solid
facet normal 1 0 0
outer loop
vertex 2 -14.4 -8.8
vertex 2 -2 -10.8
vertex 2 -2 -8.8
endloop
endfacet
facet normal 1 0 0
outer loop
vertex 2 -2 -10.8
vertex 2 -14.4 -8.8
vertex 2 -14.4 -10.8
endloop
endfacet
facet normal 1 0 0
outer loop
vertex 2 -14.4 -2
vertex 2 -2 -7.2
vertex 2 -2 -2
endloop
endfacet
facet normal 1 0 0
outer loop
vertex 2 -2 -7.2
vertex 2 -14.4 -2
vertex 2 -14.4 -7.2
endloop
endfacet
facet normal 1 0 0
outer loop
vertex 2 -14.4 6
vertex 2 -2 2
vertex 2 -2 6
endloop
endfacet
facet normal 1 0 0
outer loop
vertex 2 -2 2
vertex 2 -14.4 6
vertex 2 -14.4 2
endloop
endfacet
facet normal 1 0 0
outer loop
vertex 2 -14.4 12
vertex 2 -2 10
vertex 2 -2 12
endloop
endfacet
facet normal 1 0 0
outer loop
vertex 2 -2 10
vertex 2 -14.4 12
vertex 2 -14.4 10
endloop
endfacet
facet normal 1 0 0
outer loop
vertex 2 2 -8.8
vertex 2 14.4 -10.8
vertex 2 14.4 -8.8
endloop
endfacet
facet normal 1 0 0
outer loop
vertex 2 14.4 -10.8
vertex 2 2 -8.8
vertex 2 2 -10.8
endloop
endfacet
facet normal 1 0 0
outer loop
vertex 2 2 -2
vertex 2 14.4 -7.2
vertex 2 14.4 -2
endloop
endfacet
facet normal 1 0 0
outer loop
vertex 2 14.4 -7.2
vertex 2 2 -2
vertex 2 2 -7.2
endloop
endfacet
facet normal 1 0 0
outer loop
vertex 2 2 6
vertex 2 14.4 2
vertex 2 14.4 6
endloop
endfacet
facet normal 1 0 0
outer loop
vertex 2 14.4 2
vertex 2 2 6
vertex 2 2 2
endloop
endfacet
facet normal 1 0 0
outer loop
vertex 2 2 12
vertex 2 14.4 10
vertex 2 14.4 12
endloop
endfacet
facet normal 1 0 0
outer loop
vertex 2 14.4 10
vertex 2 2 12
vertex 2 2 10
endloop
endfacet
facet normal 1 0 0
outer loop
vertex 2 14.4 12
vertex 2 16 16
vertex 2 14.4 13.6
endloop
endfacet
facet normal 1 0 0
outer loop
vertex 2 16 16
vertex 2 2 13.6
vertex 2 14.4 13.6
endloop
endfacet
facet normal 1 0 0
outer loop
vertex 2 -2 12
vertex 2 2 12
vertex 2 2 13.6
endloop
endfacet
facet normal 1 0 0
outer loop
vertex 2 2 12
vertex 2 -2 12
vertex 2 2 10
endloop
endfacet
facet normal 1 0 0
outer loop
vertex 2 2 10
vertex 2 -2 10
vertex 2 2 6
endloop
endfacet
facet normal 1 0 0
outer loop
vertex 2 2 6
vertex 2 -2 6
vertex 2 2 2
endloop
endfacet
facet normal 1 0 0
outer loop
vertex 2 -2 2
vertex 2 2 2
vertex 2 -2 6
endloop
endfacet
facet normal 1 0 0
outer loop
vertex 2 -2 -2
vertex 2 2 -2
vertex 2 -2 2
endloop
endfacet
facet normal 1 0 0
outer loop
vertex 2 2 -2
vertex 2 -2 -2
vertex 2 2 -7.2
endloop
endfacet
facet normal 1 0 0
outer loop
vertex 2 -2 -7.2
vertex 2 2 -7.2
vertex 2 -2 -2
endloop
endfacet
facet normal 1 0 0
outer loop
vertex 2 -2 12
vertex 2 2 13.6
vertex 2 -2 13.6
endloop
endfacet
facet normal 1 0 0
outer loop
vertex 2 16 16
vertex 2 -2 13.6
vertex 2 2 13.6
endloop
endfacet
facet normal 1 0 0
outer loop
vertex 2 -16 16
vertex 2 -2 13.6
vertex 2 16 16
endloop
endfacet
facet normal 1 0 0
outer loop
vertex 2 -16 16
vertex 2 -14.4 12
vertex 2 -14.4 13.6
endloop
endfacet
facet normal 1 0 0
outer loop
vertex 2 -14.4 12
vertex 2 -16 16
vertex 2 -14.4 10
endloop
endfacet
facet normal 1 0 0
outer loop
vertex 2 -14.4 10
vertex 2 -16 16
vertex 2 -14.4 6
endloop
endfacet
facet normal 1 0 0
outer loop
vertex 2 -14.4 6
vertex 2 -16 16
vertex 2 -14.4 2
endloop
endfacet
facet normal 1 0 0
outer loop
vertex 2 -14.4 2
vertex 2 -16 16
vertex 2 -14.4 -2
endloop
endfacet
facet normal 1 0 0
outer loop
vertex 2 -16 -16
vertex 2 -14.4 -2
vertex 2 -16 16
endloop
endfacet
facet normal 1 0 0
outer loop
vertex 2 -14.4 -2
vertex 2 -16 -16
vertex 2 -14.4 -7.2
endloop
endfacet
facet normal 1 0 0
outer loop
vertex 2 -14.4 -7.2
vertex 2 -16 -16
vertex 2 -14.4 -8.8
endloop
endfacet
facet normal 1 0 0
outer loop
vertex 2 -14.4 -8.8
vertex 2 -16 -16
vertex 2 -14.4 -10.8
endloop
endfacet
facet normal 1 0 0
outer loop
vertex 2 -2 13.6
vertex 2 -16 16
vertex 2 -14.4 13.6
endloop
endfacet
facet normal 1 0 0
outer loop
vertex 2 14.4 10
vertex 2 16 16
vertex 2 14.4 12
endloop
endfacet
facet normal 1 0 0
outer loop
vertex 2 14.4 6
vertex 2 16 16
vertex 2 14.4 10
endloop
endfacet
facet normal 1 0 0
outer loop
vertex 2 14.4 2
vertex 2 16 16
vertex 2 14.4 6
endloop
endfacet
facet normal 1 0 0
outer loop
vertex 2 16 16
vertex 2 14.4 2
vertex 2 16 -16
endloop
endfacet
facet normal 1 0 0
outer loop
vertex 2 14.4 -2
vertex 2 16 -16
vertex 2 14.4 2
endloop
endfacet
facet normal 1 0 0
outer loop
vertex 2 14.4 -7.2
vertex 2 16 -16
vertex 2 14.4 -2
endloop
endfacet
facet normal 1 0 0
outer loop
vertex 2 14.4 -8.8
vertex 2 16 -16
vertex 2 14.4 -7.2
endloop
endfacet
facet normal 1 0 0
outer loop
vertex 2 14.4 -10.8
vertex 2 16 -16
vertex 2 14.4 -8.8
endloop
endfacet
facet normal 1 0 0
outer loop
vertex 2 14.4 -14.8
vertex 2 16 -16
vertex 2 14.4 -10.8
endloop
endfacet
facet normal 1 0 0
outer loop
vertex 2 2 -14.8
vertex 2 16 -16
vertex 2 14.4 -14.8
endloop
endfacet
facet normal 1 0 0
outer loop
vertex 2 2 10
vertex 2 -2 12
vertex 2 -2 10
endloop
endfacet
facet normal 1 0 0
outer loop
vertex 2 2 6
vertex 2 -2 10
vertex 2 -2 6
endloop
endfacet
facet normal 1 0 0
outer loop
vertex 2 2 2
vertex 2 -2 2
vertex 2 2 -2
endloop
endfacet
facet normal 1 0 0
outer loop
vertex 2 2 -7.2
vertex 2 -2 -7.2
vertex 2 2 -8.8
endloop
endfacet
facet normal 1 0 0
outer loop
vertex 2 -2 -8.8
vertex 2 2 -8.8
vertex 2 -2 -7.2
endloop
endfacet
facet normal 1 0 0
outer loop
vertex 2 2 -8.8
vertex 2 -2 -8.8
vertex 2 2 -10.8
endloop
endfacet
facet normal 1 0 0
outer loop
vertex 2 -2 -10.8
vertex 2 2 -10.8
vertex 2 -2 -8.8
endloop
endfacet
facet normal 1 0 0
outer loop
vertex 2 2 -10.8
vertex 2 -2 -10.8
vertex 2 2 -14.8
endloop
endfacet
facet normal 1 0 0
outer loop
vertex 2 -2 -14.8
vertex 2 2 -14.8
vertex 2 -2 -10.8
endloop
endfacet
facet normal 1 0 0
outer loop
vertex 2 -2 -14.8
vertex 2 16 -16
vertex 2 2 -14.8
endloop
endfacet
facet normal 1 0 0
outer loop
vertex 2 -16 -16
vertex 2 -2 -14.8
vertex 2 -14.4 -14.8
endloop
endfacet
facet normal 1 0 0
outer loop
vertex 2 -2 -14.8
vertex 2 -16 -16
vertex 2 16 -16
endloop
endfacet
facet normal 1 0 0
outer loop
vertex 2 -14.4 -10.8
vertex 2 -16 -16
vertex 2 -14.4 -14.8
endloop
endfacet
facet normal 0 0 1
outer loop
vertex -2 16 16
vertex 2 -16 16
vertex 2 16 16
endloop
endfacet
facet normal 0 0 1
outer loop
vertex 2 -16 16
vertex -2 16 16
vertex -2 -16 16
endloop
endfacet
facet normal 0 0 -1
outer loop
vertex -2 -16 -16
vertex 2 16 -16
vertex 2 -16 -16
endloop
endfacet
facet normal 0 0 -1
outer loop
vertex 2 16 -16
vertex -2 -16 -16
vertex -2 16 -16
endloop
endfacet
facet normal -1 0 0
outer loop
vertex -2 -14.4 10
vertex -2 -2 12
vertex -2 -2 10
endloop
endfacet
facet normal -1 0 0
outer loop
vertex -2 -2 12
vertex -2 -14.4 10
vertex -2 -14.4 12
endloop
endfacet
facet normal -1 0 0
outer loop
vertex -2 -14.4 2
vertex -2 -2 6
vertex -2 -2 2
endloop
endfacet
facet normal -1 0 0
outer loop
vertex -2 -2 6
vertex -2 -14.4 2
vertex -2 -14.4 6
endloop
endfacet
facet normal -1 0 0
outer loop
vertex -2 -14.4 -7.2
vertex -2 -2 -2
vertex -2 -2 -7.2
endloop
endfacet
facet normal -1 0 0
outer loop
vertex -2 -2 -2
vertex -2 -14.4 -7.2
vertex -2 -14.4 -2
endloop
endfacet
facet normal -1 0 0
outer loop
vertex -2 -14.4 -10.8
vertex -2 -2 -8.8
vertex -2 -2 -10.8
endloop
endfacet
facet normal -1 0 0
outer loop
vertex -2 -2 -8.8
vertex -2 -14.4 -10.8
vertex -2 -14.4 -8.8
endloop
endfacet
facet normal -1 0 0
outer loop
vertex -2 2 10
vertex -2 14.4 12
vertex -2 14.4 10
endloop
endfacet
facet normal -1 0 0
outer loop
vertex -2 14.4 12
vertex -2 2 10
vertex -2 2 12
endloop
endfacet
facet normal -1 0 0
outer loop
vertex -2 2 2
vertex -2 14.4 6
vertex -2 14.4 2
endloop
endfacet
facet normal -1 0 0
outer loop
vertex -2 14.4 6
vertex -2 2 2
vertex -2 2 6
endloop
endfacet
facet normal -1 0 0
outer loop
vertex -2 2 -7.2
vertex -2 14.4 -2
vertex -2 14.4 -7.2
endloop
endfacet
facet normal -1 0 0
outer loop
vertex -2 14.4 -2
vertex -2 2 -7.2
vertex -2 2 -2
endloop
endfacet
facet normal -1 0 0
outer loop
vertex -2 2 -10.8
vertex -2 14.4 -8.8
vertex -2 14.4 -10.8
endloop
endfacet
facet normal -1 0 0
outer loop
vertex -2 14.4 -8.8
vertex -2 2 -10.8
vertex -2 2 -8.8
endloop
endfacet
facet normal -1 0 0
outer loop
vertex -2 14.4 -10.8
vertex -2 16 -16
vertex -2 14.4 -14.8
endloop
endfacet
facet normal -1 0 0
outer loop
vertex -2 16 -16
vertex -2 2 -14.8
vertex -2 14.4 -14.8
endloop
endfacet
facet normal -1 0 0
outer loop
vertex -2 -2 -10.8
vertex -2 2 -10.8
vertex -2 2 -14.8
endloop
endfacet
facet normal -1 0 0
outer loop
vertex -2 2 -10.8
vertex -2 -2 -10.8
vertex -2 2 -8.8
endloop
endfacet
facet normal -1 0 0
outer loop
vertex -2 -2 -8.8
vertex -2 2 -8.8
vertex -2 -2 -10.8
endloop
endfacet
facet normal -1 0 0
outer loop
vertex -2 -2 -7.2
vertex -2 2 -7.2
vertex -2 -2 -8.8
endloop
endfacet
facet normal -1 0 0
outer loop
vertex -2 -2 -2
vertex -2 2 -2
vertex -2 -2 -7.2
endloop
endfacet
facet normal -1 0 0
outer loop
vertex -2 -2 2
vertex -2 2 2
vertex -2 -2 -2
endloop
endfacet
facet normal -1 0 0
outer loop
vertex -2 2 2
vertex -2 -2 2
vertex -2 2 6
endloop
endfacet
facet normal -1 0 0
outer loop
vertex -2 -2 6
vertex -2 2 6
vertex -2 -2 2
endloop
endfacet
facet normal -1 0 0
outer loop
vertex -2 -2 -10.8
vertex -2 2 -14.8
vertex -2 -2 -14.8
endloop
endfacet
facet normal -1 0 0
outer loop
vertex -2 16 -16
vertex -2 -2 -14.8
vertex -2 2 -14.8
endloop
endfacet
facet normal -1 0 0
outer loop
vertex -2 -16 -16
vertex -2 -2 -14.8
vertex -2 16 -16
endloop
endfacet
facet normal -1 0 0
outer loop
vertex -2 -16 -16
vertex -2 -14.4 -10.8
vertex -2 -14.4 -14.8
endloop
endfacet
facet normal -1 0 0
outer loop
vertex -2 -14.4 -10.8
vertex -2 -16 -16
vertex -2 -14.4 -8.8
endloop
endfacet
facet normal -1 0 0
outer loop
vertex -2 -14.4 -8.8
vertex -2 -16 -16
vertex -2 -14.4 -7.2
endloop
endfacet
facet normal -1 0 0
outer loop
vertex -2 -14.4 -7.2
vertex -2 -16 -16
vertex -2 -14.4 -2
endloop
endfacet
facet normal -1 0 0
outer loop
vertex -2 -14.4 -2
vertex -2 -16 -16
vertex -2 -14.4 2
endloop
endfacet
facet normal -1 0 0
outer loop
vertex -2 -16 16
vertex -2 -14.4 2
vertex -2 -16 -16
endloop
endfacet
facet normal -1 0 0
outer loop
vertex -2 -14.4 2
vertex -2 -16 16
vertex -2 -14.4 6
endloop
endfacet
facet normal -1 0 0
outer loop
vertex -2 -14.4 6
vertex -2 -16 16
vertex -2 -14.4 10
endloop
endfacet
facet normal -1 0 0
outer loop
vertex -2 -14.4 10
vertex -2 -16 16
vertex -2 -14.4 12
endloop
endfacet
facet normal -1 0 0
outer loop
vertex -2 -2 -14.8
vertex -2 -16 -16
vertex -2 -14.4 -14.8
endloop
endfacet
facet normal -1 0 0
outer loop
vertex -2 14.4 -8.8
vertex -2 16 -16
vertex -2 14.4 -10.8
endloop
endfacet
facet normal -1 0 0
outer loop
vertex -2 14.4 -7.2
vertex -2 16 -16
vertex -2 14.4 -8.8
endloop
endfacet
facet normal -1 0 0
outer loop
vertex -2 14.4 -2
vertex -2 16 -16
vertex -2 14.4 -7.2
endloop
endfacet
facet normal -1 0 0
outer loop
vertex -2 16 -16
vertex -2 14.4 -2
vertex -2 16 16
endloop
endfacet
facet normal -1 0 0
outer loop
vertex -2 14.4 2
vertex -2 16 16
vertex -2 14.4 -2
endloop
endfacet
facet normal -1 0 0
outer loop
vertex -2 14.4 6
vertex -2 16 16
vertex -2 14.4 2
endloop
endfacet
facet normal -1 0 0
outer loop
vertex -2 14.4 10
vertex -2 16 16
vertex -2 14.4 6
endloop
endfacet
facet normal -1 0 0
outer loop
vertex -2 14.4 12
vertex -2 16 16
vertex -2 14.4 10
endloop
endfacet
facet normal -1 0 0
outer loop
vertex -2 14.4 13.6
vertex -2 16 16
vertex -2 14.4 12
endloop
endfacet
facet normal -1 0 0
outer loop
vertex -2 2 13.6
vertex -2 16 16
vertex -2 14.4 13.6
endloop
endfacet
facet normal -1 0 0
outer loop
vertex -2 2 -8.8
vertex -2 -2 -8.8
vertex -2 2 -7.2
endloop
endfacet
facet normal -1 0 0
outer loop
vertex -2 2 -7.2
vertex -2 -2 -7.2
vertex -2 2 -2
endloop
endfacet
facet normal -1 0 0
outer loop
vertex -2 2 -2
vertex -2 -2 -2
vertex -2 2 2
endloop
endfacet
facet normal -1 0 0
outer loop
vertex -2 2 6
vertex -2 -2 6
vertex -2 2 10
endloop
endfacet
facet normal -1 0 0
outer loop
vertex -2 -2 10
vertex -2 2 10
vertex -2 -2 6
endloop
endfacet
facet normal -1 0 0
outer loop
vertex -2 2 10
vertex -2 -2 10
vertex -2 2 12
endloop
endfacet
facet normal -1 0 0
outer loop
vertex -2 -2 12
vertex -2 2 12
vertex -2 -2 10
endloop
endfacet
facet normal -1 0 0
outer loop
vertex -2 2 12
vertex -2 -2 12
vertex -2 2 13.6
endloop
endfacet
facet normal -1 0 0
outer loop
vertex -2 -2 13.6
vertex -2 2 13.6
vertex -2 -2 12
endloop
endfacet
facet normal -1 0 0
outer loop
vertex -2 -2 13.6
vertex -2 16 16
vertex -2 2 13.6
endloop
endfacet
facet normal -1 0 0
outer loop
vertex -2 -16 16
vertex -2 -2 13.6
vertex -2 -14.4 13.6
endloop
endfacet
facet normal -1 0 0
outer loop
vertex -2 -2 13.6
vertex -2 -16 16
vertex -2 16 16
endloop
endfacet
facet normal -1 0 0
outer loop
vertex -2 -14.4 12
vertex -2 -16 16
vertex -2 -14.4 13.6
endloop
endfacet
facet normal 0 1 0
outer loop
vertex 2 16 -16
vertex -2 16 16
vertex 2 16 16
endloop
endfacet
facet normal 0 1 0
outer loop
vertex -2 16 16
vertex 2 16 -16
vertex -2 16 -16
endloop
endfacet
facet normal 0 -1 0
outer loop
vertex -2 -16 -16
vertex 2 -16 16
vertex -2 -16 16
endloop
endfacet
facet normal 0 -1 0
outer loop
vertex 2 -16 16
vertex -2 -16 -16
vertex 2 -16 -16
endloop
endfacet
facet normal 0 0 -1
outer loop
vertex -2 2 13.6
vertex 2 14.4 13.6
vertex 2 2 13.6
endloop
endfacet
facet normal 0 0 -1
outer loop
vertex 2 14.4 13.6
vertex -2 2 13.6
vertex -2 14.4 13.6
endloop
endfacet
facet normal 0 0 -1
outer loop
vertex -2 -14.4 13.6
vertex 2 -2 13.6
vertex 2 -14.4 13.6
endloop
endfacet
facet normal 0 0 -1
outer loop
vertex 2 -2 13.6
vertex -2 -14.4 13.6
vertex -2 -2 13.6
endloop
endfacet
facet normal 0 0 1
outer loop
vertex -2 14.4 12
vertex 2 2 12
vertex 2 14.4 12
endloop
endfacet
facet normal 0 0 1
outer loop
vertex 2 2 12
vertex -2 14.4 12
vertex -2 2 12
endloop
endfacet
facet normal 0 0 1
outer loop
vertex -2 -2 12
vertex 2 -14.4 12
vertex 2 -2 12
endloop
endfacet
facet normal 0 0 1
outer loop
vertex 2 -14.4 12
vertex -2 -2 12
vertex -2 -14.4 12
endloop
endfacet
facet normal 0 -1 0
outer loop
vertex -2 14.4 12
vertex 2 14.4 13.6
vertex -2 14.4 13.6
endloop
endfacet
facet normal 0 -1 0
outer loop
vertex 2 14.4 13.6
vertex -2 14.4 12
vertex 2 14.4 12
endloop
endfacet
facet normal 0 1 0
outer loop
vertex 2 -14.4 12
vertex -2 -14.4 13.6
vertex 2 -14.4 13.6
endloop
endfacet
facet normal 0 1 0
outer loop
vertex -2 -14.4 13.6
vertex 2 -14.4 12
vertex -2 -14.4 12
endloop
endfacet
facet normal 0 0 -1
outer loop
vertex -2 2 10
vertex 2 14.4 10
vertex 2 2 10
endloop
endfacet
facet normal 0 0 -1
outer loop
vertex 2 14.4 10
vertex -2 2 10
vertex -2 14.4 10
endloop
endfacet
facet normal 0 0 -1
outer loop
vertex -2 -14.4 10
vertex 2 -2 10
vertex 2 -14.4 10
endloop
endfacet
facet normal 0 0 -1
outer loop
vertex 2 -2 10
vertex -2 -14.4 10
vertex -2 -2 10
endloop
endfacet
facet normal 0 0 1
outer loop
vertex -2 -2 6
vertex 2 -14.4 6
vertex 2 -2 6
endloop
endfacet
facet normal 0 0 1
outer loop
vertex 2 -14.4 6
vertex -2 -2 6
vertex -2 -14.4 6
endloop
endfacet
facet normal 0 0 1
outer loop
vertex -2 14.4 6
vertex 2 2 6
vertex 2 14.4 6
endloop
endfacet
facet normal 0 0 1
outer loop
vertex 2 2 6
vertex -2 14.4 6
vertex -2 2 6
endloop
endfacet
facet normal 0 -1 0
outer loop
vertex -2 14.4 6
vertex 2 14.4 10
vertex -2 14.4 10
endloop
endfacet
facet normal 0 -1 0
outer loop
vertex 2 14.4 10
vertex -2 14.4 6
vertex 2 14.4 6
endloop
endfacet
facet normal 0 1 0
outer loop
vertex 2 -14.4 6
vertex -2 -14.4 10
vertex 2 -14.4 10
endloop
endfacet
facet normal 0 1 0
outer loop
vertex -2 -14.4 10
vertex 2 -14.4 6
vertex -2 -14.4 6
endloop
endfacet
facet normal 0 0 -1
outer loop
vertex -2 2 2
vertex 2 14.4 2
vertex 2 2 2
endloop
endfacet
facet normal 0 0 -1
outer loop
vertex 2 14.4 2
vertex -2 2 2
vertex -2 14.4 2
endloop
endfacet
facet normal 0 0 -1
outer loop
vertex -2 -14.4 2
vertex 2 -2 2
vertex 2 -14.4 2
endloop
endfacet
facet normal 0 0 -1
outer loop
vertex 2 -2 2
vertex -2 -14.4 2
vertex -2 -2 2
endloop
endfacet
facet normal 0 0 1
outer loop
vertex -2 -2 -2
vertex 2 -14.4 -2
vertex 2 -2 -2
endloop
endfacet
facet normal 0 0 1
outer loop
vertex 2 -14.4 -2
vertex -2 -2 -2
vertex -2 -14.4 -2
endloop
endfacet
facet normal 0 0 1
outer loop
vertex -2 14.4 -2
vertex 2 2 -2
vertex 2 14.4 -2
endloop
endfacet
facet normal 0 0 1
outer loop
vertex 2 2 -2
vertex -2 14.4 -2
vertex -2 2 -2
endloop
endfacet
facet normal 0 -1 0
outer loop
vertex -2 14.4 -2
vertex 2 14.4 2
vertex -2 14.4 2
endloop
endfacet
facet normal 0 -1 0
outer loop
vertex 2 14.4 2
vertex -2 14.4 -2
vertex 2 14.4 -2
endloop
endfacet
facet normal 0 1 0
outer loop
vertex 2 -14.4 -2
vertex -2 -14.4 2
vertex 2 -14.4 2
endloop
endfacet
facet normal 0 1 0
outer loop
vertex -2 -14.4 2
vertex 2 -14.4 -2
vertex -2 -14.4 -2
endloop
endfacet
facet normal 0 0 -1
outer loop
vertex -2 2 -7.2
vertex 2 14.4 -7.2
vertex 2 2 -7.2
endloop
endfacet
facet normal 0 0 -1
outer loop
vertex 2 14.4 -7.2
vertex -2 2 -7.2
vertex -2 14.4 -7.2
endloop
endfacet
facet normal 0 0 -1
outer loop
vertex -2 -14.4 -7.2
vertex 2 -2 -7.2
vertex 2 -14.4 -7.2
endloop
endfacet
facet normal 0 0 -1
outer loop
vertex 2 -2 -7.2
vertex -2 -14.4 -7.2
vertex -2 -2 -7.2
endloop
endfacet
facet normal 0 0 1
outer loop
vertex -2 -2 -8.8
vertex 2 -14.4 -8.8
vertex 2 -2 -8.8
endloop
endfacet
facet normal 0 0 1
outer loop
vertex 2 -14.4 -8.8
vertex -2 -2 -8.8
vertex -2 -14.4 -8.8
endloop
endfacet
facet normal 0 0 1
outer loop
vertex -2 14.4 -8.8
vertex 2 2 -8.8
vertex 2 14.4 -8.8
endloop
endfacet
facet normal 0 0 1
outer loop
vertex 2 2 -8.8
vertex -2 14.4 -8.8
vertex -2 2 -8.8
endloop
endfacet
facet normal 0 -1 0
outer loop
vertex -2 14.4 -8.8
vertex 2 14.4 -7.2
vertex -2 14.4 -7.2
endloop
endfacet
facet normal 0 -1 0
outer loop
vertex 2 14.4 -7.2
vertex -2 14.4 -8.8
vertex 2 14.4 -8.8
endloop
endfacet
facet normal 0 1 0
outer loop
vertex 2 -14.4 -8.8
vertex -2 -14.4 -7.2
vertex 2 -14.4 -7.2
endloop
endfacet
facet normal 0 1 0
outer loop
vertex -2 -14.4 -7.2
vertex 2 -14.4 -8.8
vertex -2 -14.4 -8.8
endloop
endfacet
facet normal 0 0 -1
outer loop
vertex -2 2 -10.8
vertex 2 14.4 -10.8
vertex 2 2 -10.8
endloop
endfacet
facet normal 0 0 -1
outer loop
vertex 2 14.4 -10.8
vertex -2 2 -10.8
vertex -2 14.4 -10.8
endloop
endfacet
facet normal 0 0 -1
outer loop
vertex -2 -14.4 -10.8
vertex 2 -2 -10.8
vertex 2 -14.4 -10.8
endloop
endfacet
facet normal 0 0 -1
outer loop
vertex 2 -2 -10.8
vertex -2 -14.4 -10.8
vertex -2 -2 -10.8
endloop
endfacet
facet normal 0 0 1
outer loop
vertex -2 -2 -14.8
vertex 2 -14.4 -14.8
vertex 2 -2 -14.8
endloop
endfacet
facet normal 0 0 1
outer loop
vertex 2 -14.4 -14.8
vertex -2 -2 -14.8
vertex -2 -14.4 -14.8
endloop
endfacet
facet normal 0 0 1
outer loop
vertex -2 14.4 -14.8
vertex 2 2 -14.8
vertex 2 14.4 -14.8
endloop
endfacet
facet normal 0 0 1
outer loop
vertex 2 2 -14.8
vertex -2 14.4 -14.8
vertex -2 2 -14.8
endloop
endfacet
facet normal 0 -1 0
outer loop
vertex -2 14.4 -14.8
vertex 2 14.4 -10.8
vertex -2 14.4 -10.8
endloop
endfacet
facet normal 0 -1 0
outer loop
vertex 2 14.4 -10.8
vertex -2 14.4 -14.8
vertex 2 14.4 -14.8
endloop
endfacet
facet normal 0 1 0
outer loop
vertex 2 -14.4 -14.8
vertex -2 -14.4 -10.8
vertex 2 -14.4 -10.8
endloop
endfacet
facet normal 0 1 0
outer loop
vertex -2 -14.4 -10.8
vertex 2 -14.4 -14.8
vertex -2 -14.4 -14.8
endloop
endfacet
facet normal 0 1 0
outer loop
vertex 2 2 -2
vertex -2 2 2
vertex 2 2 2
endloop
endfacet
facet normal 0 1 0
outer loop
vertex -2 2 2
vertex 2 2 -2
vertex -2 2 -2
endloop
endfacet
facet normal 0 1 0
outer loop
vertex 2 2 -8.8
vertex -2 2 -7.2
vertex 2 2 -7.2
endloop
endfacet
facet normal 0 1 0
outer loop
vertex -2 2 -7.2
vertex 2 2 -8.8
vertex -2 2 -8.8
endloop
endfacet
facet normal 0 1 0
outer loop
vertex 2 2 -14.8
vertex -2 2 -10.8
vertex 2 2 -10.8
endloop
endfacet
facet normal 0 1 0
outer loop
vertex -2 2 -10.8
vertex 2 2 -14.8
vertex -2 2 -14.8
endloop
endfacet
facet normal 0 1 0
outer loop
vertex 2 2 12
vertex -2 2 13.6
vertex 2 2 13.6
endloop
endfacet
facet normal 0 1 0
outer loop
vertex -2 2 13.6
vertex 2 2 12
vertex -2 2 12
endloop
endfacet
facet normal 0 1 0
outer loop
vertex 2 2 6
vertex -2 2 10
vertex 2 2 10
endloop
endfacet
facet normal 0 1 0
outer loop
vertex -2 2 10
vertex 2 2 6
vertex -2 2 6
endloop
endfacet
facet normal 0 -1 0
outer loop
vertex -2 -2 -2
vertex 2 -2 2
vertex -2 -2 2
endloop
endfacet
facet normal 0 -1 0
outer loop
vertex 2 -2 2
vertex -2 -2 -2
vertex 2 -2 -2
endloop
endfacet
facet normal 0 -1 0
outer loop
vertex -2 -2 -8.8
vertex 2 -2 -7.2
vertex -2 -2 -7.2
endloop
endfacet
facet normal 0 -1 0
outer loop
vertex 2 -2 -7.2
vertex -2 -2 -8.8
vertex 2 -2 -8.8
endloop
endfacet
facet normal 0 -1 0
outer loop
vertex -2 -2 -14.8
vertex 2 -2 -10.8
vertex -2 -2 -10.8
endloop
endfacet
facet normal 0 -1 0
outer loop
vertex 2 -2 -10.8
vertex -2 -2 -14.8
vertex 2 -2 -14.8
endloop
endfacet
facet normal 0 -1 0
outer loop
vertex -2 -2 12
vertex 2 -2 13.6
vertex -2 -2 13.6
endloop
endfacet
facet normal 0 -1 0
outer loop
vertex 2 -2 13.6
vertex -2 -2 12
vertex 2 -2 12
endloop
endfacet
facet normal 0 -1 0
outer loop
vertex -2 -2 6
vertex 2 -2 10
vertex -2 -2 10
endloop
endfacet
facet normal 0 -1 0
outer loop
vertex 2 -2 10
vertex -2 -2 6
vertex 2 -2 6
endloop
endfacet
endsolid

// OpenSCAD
size = 32;//block=32 //item=8

difference() {
  cube([size * 0.125, size, size], center = true);
  translate([0, 0, size * 0.40]) {
    cube([size * 1.25, size * 0.9, size * 0.05], center = true);
  }
  ;//translate
  translate([0, 0, size * 0.25]) {
    cube([size * 1.25, size * 0.9, size * 0.125], center = true);
  }
  ;//translate
  translate([0, 0, 0]) {
    cube([size * 1.25, size * 0.9, size * 0.125], center = true);
  }
  ;//translate
  translate([0, 0, -size * 0.25]) {
    cube([size * 1.25, size * 0.9, size * 0.05], center = true);
  }
  ;//translate
  translate([0, 0, -size * 0.40]) {
    cube([size * 1.25, size * 0.9, size * 0.125], center = true);
  }
  ;//translate
}
;//difference
cube([size * 0.125, size * 0.125, size], center = true);
